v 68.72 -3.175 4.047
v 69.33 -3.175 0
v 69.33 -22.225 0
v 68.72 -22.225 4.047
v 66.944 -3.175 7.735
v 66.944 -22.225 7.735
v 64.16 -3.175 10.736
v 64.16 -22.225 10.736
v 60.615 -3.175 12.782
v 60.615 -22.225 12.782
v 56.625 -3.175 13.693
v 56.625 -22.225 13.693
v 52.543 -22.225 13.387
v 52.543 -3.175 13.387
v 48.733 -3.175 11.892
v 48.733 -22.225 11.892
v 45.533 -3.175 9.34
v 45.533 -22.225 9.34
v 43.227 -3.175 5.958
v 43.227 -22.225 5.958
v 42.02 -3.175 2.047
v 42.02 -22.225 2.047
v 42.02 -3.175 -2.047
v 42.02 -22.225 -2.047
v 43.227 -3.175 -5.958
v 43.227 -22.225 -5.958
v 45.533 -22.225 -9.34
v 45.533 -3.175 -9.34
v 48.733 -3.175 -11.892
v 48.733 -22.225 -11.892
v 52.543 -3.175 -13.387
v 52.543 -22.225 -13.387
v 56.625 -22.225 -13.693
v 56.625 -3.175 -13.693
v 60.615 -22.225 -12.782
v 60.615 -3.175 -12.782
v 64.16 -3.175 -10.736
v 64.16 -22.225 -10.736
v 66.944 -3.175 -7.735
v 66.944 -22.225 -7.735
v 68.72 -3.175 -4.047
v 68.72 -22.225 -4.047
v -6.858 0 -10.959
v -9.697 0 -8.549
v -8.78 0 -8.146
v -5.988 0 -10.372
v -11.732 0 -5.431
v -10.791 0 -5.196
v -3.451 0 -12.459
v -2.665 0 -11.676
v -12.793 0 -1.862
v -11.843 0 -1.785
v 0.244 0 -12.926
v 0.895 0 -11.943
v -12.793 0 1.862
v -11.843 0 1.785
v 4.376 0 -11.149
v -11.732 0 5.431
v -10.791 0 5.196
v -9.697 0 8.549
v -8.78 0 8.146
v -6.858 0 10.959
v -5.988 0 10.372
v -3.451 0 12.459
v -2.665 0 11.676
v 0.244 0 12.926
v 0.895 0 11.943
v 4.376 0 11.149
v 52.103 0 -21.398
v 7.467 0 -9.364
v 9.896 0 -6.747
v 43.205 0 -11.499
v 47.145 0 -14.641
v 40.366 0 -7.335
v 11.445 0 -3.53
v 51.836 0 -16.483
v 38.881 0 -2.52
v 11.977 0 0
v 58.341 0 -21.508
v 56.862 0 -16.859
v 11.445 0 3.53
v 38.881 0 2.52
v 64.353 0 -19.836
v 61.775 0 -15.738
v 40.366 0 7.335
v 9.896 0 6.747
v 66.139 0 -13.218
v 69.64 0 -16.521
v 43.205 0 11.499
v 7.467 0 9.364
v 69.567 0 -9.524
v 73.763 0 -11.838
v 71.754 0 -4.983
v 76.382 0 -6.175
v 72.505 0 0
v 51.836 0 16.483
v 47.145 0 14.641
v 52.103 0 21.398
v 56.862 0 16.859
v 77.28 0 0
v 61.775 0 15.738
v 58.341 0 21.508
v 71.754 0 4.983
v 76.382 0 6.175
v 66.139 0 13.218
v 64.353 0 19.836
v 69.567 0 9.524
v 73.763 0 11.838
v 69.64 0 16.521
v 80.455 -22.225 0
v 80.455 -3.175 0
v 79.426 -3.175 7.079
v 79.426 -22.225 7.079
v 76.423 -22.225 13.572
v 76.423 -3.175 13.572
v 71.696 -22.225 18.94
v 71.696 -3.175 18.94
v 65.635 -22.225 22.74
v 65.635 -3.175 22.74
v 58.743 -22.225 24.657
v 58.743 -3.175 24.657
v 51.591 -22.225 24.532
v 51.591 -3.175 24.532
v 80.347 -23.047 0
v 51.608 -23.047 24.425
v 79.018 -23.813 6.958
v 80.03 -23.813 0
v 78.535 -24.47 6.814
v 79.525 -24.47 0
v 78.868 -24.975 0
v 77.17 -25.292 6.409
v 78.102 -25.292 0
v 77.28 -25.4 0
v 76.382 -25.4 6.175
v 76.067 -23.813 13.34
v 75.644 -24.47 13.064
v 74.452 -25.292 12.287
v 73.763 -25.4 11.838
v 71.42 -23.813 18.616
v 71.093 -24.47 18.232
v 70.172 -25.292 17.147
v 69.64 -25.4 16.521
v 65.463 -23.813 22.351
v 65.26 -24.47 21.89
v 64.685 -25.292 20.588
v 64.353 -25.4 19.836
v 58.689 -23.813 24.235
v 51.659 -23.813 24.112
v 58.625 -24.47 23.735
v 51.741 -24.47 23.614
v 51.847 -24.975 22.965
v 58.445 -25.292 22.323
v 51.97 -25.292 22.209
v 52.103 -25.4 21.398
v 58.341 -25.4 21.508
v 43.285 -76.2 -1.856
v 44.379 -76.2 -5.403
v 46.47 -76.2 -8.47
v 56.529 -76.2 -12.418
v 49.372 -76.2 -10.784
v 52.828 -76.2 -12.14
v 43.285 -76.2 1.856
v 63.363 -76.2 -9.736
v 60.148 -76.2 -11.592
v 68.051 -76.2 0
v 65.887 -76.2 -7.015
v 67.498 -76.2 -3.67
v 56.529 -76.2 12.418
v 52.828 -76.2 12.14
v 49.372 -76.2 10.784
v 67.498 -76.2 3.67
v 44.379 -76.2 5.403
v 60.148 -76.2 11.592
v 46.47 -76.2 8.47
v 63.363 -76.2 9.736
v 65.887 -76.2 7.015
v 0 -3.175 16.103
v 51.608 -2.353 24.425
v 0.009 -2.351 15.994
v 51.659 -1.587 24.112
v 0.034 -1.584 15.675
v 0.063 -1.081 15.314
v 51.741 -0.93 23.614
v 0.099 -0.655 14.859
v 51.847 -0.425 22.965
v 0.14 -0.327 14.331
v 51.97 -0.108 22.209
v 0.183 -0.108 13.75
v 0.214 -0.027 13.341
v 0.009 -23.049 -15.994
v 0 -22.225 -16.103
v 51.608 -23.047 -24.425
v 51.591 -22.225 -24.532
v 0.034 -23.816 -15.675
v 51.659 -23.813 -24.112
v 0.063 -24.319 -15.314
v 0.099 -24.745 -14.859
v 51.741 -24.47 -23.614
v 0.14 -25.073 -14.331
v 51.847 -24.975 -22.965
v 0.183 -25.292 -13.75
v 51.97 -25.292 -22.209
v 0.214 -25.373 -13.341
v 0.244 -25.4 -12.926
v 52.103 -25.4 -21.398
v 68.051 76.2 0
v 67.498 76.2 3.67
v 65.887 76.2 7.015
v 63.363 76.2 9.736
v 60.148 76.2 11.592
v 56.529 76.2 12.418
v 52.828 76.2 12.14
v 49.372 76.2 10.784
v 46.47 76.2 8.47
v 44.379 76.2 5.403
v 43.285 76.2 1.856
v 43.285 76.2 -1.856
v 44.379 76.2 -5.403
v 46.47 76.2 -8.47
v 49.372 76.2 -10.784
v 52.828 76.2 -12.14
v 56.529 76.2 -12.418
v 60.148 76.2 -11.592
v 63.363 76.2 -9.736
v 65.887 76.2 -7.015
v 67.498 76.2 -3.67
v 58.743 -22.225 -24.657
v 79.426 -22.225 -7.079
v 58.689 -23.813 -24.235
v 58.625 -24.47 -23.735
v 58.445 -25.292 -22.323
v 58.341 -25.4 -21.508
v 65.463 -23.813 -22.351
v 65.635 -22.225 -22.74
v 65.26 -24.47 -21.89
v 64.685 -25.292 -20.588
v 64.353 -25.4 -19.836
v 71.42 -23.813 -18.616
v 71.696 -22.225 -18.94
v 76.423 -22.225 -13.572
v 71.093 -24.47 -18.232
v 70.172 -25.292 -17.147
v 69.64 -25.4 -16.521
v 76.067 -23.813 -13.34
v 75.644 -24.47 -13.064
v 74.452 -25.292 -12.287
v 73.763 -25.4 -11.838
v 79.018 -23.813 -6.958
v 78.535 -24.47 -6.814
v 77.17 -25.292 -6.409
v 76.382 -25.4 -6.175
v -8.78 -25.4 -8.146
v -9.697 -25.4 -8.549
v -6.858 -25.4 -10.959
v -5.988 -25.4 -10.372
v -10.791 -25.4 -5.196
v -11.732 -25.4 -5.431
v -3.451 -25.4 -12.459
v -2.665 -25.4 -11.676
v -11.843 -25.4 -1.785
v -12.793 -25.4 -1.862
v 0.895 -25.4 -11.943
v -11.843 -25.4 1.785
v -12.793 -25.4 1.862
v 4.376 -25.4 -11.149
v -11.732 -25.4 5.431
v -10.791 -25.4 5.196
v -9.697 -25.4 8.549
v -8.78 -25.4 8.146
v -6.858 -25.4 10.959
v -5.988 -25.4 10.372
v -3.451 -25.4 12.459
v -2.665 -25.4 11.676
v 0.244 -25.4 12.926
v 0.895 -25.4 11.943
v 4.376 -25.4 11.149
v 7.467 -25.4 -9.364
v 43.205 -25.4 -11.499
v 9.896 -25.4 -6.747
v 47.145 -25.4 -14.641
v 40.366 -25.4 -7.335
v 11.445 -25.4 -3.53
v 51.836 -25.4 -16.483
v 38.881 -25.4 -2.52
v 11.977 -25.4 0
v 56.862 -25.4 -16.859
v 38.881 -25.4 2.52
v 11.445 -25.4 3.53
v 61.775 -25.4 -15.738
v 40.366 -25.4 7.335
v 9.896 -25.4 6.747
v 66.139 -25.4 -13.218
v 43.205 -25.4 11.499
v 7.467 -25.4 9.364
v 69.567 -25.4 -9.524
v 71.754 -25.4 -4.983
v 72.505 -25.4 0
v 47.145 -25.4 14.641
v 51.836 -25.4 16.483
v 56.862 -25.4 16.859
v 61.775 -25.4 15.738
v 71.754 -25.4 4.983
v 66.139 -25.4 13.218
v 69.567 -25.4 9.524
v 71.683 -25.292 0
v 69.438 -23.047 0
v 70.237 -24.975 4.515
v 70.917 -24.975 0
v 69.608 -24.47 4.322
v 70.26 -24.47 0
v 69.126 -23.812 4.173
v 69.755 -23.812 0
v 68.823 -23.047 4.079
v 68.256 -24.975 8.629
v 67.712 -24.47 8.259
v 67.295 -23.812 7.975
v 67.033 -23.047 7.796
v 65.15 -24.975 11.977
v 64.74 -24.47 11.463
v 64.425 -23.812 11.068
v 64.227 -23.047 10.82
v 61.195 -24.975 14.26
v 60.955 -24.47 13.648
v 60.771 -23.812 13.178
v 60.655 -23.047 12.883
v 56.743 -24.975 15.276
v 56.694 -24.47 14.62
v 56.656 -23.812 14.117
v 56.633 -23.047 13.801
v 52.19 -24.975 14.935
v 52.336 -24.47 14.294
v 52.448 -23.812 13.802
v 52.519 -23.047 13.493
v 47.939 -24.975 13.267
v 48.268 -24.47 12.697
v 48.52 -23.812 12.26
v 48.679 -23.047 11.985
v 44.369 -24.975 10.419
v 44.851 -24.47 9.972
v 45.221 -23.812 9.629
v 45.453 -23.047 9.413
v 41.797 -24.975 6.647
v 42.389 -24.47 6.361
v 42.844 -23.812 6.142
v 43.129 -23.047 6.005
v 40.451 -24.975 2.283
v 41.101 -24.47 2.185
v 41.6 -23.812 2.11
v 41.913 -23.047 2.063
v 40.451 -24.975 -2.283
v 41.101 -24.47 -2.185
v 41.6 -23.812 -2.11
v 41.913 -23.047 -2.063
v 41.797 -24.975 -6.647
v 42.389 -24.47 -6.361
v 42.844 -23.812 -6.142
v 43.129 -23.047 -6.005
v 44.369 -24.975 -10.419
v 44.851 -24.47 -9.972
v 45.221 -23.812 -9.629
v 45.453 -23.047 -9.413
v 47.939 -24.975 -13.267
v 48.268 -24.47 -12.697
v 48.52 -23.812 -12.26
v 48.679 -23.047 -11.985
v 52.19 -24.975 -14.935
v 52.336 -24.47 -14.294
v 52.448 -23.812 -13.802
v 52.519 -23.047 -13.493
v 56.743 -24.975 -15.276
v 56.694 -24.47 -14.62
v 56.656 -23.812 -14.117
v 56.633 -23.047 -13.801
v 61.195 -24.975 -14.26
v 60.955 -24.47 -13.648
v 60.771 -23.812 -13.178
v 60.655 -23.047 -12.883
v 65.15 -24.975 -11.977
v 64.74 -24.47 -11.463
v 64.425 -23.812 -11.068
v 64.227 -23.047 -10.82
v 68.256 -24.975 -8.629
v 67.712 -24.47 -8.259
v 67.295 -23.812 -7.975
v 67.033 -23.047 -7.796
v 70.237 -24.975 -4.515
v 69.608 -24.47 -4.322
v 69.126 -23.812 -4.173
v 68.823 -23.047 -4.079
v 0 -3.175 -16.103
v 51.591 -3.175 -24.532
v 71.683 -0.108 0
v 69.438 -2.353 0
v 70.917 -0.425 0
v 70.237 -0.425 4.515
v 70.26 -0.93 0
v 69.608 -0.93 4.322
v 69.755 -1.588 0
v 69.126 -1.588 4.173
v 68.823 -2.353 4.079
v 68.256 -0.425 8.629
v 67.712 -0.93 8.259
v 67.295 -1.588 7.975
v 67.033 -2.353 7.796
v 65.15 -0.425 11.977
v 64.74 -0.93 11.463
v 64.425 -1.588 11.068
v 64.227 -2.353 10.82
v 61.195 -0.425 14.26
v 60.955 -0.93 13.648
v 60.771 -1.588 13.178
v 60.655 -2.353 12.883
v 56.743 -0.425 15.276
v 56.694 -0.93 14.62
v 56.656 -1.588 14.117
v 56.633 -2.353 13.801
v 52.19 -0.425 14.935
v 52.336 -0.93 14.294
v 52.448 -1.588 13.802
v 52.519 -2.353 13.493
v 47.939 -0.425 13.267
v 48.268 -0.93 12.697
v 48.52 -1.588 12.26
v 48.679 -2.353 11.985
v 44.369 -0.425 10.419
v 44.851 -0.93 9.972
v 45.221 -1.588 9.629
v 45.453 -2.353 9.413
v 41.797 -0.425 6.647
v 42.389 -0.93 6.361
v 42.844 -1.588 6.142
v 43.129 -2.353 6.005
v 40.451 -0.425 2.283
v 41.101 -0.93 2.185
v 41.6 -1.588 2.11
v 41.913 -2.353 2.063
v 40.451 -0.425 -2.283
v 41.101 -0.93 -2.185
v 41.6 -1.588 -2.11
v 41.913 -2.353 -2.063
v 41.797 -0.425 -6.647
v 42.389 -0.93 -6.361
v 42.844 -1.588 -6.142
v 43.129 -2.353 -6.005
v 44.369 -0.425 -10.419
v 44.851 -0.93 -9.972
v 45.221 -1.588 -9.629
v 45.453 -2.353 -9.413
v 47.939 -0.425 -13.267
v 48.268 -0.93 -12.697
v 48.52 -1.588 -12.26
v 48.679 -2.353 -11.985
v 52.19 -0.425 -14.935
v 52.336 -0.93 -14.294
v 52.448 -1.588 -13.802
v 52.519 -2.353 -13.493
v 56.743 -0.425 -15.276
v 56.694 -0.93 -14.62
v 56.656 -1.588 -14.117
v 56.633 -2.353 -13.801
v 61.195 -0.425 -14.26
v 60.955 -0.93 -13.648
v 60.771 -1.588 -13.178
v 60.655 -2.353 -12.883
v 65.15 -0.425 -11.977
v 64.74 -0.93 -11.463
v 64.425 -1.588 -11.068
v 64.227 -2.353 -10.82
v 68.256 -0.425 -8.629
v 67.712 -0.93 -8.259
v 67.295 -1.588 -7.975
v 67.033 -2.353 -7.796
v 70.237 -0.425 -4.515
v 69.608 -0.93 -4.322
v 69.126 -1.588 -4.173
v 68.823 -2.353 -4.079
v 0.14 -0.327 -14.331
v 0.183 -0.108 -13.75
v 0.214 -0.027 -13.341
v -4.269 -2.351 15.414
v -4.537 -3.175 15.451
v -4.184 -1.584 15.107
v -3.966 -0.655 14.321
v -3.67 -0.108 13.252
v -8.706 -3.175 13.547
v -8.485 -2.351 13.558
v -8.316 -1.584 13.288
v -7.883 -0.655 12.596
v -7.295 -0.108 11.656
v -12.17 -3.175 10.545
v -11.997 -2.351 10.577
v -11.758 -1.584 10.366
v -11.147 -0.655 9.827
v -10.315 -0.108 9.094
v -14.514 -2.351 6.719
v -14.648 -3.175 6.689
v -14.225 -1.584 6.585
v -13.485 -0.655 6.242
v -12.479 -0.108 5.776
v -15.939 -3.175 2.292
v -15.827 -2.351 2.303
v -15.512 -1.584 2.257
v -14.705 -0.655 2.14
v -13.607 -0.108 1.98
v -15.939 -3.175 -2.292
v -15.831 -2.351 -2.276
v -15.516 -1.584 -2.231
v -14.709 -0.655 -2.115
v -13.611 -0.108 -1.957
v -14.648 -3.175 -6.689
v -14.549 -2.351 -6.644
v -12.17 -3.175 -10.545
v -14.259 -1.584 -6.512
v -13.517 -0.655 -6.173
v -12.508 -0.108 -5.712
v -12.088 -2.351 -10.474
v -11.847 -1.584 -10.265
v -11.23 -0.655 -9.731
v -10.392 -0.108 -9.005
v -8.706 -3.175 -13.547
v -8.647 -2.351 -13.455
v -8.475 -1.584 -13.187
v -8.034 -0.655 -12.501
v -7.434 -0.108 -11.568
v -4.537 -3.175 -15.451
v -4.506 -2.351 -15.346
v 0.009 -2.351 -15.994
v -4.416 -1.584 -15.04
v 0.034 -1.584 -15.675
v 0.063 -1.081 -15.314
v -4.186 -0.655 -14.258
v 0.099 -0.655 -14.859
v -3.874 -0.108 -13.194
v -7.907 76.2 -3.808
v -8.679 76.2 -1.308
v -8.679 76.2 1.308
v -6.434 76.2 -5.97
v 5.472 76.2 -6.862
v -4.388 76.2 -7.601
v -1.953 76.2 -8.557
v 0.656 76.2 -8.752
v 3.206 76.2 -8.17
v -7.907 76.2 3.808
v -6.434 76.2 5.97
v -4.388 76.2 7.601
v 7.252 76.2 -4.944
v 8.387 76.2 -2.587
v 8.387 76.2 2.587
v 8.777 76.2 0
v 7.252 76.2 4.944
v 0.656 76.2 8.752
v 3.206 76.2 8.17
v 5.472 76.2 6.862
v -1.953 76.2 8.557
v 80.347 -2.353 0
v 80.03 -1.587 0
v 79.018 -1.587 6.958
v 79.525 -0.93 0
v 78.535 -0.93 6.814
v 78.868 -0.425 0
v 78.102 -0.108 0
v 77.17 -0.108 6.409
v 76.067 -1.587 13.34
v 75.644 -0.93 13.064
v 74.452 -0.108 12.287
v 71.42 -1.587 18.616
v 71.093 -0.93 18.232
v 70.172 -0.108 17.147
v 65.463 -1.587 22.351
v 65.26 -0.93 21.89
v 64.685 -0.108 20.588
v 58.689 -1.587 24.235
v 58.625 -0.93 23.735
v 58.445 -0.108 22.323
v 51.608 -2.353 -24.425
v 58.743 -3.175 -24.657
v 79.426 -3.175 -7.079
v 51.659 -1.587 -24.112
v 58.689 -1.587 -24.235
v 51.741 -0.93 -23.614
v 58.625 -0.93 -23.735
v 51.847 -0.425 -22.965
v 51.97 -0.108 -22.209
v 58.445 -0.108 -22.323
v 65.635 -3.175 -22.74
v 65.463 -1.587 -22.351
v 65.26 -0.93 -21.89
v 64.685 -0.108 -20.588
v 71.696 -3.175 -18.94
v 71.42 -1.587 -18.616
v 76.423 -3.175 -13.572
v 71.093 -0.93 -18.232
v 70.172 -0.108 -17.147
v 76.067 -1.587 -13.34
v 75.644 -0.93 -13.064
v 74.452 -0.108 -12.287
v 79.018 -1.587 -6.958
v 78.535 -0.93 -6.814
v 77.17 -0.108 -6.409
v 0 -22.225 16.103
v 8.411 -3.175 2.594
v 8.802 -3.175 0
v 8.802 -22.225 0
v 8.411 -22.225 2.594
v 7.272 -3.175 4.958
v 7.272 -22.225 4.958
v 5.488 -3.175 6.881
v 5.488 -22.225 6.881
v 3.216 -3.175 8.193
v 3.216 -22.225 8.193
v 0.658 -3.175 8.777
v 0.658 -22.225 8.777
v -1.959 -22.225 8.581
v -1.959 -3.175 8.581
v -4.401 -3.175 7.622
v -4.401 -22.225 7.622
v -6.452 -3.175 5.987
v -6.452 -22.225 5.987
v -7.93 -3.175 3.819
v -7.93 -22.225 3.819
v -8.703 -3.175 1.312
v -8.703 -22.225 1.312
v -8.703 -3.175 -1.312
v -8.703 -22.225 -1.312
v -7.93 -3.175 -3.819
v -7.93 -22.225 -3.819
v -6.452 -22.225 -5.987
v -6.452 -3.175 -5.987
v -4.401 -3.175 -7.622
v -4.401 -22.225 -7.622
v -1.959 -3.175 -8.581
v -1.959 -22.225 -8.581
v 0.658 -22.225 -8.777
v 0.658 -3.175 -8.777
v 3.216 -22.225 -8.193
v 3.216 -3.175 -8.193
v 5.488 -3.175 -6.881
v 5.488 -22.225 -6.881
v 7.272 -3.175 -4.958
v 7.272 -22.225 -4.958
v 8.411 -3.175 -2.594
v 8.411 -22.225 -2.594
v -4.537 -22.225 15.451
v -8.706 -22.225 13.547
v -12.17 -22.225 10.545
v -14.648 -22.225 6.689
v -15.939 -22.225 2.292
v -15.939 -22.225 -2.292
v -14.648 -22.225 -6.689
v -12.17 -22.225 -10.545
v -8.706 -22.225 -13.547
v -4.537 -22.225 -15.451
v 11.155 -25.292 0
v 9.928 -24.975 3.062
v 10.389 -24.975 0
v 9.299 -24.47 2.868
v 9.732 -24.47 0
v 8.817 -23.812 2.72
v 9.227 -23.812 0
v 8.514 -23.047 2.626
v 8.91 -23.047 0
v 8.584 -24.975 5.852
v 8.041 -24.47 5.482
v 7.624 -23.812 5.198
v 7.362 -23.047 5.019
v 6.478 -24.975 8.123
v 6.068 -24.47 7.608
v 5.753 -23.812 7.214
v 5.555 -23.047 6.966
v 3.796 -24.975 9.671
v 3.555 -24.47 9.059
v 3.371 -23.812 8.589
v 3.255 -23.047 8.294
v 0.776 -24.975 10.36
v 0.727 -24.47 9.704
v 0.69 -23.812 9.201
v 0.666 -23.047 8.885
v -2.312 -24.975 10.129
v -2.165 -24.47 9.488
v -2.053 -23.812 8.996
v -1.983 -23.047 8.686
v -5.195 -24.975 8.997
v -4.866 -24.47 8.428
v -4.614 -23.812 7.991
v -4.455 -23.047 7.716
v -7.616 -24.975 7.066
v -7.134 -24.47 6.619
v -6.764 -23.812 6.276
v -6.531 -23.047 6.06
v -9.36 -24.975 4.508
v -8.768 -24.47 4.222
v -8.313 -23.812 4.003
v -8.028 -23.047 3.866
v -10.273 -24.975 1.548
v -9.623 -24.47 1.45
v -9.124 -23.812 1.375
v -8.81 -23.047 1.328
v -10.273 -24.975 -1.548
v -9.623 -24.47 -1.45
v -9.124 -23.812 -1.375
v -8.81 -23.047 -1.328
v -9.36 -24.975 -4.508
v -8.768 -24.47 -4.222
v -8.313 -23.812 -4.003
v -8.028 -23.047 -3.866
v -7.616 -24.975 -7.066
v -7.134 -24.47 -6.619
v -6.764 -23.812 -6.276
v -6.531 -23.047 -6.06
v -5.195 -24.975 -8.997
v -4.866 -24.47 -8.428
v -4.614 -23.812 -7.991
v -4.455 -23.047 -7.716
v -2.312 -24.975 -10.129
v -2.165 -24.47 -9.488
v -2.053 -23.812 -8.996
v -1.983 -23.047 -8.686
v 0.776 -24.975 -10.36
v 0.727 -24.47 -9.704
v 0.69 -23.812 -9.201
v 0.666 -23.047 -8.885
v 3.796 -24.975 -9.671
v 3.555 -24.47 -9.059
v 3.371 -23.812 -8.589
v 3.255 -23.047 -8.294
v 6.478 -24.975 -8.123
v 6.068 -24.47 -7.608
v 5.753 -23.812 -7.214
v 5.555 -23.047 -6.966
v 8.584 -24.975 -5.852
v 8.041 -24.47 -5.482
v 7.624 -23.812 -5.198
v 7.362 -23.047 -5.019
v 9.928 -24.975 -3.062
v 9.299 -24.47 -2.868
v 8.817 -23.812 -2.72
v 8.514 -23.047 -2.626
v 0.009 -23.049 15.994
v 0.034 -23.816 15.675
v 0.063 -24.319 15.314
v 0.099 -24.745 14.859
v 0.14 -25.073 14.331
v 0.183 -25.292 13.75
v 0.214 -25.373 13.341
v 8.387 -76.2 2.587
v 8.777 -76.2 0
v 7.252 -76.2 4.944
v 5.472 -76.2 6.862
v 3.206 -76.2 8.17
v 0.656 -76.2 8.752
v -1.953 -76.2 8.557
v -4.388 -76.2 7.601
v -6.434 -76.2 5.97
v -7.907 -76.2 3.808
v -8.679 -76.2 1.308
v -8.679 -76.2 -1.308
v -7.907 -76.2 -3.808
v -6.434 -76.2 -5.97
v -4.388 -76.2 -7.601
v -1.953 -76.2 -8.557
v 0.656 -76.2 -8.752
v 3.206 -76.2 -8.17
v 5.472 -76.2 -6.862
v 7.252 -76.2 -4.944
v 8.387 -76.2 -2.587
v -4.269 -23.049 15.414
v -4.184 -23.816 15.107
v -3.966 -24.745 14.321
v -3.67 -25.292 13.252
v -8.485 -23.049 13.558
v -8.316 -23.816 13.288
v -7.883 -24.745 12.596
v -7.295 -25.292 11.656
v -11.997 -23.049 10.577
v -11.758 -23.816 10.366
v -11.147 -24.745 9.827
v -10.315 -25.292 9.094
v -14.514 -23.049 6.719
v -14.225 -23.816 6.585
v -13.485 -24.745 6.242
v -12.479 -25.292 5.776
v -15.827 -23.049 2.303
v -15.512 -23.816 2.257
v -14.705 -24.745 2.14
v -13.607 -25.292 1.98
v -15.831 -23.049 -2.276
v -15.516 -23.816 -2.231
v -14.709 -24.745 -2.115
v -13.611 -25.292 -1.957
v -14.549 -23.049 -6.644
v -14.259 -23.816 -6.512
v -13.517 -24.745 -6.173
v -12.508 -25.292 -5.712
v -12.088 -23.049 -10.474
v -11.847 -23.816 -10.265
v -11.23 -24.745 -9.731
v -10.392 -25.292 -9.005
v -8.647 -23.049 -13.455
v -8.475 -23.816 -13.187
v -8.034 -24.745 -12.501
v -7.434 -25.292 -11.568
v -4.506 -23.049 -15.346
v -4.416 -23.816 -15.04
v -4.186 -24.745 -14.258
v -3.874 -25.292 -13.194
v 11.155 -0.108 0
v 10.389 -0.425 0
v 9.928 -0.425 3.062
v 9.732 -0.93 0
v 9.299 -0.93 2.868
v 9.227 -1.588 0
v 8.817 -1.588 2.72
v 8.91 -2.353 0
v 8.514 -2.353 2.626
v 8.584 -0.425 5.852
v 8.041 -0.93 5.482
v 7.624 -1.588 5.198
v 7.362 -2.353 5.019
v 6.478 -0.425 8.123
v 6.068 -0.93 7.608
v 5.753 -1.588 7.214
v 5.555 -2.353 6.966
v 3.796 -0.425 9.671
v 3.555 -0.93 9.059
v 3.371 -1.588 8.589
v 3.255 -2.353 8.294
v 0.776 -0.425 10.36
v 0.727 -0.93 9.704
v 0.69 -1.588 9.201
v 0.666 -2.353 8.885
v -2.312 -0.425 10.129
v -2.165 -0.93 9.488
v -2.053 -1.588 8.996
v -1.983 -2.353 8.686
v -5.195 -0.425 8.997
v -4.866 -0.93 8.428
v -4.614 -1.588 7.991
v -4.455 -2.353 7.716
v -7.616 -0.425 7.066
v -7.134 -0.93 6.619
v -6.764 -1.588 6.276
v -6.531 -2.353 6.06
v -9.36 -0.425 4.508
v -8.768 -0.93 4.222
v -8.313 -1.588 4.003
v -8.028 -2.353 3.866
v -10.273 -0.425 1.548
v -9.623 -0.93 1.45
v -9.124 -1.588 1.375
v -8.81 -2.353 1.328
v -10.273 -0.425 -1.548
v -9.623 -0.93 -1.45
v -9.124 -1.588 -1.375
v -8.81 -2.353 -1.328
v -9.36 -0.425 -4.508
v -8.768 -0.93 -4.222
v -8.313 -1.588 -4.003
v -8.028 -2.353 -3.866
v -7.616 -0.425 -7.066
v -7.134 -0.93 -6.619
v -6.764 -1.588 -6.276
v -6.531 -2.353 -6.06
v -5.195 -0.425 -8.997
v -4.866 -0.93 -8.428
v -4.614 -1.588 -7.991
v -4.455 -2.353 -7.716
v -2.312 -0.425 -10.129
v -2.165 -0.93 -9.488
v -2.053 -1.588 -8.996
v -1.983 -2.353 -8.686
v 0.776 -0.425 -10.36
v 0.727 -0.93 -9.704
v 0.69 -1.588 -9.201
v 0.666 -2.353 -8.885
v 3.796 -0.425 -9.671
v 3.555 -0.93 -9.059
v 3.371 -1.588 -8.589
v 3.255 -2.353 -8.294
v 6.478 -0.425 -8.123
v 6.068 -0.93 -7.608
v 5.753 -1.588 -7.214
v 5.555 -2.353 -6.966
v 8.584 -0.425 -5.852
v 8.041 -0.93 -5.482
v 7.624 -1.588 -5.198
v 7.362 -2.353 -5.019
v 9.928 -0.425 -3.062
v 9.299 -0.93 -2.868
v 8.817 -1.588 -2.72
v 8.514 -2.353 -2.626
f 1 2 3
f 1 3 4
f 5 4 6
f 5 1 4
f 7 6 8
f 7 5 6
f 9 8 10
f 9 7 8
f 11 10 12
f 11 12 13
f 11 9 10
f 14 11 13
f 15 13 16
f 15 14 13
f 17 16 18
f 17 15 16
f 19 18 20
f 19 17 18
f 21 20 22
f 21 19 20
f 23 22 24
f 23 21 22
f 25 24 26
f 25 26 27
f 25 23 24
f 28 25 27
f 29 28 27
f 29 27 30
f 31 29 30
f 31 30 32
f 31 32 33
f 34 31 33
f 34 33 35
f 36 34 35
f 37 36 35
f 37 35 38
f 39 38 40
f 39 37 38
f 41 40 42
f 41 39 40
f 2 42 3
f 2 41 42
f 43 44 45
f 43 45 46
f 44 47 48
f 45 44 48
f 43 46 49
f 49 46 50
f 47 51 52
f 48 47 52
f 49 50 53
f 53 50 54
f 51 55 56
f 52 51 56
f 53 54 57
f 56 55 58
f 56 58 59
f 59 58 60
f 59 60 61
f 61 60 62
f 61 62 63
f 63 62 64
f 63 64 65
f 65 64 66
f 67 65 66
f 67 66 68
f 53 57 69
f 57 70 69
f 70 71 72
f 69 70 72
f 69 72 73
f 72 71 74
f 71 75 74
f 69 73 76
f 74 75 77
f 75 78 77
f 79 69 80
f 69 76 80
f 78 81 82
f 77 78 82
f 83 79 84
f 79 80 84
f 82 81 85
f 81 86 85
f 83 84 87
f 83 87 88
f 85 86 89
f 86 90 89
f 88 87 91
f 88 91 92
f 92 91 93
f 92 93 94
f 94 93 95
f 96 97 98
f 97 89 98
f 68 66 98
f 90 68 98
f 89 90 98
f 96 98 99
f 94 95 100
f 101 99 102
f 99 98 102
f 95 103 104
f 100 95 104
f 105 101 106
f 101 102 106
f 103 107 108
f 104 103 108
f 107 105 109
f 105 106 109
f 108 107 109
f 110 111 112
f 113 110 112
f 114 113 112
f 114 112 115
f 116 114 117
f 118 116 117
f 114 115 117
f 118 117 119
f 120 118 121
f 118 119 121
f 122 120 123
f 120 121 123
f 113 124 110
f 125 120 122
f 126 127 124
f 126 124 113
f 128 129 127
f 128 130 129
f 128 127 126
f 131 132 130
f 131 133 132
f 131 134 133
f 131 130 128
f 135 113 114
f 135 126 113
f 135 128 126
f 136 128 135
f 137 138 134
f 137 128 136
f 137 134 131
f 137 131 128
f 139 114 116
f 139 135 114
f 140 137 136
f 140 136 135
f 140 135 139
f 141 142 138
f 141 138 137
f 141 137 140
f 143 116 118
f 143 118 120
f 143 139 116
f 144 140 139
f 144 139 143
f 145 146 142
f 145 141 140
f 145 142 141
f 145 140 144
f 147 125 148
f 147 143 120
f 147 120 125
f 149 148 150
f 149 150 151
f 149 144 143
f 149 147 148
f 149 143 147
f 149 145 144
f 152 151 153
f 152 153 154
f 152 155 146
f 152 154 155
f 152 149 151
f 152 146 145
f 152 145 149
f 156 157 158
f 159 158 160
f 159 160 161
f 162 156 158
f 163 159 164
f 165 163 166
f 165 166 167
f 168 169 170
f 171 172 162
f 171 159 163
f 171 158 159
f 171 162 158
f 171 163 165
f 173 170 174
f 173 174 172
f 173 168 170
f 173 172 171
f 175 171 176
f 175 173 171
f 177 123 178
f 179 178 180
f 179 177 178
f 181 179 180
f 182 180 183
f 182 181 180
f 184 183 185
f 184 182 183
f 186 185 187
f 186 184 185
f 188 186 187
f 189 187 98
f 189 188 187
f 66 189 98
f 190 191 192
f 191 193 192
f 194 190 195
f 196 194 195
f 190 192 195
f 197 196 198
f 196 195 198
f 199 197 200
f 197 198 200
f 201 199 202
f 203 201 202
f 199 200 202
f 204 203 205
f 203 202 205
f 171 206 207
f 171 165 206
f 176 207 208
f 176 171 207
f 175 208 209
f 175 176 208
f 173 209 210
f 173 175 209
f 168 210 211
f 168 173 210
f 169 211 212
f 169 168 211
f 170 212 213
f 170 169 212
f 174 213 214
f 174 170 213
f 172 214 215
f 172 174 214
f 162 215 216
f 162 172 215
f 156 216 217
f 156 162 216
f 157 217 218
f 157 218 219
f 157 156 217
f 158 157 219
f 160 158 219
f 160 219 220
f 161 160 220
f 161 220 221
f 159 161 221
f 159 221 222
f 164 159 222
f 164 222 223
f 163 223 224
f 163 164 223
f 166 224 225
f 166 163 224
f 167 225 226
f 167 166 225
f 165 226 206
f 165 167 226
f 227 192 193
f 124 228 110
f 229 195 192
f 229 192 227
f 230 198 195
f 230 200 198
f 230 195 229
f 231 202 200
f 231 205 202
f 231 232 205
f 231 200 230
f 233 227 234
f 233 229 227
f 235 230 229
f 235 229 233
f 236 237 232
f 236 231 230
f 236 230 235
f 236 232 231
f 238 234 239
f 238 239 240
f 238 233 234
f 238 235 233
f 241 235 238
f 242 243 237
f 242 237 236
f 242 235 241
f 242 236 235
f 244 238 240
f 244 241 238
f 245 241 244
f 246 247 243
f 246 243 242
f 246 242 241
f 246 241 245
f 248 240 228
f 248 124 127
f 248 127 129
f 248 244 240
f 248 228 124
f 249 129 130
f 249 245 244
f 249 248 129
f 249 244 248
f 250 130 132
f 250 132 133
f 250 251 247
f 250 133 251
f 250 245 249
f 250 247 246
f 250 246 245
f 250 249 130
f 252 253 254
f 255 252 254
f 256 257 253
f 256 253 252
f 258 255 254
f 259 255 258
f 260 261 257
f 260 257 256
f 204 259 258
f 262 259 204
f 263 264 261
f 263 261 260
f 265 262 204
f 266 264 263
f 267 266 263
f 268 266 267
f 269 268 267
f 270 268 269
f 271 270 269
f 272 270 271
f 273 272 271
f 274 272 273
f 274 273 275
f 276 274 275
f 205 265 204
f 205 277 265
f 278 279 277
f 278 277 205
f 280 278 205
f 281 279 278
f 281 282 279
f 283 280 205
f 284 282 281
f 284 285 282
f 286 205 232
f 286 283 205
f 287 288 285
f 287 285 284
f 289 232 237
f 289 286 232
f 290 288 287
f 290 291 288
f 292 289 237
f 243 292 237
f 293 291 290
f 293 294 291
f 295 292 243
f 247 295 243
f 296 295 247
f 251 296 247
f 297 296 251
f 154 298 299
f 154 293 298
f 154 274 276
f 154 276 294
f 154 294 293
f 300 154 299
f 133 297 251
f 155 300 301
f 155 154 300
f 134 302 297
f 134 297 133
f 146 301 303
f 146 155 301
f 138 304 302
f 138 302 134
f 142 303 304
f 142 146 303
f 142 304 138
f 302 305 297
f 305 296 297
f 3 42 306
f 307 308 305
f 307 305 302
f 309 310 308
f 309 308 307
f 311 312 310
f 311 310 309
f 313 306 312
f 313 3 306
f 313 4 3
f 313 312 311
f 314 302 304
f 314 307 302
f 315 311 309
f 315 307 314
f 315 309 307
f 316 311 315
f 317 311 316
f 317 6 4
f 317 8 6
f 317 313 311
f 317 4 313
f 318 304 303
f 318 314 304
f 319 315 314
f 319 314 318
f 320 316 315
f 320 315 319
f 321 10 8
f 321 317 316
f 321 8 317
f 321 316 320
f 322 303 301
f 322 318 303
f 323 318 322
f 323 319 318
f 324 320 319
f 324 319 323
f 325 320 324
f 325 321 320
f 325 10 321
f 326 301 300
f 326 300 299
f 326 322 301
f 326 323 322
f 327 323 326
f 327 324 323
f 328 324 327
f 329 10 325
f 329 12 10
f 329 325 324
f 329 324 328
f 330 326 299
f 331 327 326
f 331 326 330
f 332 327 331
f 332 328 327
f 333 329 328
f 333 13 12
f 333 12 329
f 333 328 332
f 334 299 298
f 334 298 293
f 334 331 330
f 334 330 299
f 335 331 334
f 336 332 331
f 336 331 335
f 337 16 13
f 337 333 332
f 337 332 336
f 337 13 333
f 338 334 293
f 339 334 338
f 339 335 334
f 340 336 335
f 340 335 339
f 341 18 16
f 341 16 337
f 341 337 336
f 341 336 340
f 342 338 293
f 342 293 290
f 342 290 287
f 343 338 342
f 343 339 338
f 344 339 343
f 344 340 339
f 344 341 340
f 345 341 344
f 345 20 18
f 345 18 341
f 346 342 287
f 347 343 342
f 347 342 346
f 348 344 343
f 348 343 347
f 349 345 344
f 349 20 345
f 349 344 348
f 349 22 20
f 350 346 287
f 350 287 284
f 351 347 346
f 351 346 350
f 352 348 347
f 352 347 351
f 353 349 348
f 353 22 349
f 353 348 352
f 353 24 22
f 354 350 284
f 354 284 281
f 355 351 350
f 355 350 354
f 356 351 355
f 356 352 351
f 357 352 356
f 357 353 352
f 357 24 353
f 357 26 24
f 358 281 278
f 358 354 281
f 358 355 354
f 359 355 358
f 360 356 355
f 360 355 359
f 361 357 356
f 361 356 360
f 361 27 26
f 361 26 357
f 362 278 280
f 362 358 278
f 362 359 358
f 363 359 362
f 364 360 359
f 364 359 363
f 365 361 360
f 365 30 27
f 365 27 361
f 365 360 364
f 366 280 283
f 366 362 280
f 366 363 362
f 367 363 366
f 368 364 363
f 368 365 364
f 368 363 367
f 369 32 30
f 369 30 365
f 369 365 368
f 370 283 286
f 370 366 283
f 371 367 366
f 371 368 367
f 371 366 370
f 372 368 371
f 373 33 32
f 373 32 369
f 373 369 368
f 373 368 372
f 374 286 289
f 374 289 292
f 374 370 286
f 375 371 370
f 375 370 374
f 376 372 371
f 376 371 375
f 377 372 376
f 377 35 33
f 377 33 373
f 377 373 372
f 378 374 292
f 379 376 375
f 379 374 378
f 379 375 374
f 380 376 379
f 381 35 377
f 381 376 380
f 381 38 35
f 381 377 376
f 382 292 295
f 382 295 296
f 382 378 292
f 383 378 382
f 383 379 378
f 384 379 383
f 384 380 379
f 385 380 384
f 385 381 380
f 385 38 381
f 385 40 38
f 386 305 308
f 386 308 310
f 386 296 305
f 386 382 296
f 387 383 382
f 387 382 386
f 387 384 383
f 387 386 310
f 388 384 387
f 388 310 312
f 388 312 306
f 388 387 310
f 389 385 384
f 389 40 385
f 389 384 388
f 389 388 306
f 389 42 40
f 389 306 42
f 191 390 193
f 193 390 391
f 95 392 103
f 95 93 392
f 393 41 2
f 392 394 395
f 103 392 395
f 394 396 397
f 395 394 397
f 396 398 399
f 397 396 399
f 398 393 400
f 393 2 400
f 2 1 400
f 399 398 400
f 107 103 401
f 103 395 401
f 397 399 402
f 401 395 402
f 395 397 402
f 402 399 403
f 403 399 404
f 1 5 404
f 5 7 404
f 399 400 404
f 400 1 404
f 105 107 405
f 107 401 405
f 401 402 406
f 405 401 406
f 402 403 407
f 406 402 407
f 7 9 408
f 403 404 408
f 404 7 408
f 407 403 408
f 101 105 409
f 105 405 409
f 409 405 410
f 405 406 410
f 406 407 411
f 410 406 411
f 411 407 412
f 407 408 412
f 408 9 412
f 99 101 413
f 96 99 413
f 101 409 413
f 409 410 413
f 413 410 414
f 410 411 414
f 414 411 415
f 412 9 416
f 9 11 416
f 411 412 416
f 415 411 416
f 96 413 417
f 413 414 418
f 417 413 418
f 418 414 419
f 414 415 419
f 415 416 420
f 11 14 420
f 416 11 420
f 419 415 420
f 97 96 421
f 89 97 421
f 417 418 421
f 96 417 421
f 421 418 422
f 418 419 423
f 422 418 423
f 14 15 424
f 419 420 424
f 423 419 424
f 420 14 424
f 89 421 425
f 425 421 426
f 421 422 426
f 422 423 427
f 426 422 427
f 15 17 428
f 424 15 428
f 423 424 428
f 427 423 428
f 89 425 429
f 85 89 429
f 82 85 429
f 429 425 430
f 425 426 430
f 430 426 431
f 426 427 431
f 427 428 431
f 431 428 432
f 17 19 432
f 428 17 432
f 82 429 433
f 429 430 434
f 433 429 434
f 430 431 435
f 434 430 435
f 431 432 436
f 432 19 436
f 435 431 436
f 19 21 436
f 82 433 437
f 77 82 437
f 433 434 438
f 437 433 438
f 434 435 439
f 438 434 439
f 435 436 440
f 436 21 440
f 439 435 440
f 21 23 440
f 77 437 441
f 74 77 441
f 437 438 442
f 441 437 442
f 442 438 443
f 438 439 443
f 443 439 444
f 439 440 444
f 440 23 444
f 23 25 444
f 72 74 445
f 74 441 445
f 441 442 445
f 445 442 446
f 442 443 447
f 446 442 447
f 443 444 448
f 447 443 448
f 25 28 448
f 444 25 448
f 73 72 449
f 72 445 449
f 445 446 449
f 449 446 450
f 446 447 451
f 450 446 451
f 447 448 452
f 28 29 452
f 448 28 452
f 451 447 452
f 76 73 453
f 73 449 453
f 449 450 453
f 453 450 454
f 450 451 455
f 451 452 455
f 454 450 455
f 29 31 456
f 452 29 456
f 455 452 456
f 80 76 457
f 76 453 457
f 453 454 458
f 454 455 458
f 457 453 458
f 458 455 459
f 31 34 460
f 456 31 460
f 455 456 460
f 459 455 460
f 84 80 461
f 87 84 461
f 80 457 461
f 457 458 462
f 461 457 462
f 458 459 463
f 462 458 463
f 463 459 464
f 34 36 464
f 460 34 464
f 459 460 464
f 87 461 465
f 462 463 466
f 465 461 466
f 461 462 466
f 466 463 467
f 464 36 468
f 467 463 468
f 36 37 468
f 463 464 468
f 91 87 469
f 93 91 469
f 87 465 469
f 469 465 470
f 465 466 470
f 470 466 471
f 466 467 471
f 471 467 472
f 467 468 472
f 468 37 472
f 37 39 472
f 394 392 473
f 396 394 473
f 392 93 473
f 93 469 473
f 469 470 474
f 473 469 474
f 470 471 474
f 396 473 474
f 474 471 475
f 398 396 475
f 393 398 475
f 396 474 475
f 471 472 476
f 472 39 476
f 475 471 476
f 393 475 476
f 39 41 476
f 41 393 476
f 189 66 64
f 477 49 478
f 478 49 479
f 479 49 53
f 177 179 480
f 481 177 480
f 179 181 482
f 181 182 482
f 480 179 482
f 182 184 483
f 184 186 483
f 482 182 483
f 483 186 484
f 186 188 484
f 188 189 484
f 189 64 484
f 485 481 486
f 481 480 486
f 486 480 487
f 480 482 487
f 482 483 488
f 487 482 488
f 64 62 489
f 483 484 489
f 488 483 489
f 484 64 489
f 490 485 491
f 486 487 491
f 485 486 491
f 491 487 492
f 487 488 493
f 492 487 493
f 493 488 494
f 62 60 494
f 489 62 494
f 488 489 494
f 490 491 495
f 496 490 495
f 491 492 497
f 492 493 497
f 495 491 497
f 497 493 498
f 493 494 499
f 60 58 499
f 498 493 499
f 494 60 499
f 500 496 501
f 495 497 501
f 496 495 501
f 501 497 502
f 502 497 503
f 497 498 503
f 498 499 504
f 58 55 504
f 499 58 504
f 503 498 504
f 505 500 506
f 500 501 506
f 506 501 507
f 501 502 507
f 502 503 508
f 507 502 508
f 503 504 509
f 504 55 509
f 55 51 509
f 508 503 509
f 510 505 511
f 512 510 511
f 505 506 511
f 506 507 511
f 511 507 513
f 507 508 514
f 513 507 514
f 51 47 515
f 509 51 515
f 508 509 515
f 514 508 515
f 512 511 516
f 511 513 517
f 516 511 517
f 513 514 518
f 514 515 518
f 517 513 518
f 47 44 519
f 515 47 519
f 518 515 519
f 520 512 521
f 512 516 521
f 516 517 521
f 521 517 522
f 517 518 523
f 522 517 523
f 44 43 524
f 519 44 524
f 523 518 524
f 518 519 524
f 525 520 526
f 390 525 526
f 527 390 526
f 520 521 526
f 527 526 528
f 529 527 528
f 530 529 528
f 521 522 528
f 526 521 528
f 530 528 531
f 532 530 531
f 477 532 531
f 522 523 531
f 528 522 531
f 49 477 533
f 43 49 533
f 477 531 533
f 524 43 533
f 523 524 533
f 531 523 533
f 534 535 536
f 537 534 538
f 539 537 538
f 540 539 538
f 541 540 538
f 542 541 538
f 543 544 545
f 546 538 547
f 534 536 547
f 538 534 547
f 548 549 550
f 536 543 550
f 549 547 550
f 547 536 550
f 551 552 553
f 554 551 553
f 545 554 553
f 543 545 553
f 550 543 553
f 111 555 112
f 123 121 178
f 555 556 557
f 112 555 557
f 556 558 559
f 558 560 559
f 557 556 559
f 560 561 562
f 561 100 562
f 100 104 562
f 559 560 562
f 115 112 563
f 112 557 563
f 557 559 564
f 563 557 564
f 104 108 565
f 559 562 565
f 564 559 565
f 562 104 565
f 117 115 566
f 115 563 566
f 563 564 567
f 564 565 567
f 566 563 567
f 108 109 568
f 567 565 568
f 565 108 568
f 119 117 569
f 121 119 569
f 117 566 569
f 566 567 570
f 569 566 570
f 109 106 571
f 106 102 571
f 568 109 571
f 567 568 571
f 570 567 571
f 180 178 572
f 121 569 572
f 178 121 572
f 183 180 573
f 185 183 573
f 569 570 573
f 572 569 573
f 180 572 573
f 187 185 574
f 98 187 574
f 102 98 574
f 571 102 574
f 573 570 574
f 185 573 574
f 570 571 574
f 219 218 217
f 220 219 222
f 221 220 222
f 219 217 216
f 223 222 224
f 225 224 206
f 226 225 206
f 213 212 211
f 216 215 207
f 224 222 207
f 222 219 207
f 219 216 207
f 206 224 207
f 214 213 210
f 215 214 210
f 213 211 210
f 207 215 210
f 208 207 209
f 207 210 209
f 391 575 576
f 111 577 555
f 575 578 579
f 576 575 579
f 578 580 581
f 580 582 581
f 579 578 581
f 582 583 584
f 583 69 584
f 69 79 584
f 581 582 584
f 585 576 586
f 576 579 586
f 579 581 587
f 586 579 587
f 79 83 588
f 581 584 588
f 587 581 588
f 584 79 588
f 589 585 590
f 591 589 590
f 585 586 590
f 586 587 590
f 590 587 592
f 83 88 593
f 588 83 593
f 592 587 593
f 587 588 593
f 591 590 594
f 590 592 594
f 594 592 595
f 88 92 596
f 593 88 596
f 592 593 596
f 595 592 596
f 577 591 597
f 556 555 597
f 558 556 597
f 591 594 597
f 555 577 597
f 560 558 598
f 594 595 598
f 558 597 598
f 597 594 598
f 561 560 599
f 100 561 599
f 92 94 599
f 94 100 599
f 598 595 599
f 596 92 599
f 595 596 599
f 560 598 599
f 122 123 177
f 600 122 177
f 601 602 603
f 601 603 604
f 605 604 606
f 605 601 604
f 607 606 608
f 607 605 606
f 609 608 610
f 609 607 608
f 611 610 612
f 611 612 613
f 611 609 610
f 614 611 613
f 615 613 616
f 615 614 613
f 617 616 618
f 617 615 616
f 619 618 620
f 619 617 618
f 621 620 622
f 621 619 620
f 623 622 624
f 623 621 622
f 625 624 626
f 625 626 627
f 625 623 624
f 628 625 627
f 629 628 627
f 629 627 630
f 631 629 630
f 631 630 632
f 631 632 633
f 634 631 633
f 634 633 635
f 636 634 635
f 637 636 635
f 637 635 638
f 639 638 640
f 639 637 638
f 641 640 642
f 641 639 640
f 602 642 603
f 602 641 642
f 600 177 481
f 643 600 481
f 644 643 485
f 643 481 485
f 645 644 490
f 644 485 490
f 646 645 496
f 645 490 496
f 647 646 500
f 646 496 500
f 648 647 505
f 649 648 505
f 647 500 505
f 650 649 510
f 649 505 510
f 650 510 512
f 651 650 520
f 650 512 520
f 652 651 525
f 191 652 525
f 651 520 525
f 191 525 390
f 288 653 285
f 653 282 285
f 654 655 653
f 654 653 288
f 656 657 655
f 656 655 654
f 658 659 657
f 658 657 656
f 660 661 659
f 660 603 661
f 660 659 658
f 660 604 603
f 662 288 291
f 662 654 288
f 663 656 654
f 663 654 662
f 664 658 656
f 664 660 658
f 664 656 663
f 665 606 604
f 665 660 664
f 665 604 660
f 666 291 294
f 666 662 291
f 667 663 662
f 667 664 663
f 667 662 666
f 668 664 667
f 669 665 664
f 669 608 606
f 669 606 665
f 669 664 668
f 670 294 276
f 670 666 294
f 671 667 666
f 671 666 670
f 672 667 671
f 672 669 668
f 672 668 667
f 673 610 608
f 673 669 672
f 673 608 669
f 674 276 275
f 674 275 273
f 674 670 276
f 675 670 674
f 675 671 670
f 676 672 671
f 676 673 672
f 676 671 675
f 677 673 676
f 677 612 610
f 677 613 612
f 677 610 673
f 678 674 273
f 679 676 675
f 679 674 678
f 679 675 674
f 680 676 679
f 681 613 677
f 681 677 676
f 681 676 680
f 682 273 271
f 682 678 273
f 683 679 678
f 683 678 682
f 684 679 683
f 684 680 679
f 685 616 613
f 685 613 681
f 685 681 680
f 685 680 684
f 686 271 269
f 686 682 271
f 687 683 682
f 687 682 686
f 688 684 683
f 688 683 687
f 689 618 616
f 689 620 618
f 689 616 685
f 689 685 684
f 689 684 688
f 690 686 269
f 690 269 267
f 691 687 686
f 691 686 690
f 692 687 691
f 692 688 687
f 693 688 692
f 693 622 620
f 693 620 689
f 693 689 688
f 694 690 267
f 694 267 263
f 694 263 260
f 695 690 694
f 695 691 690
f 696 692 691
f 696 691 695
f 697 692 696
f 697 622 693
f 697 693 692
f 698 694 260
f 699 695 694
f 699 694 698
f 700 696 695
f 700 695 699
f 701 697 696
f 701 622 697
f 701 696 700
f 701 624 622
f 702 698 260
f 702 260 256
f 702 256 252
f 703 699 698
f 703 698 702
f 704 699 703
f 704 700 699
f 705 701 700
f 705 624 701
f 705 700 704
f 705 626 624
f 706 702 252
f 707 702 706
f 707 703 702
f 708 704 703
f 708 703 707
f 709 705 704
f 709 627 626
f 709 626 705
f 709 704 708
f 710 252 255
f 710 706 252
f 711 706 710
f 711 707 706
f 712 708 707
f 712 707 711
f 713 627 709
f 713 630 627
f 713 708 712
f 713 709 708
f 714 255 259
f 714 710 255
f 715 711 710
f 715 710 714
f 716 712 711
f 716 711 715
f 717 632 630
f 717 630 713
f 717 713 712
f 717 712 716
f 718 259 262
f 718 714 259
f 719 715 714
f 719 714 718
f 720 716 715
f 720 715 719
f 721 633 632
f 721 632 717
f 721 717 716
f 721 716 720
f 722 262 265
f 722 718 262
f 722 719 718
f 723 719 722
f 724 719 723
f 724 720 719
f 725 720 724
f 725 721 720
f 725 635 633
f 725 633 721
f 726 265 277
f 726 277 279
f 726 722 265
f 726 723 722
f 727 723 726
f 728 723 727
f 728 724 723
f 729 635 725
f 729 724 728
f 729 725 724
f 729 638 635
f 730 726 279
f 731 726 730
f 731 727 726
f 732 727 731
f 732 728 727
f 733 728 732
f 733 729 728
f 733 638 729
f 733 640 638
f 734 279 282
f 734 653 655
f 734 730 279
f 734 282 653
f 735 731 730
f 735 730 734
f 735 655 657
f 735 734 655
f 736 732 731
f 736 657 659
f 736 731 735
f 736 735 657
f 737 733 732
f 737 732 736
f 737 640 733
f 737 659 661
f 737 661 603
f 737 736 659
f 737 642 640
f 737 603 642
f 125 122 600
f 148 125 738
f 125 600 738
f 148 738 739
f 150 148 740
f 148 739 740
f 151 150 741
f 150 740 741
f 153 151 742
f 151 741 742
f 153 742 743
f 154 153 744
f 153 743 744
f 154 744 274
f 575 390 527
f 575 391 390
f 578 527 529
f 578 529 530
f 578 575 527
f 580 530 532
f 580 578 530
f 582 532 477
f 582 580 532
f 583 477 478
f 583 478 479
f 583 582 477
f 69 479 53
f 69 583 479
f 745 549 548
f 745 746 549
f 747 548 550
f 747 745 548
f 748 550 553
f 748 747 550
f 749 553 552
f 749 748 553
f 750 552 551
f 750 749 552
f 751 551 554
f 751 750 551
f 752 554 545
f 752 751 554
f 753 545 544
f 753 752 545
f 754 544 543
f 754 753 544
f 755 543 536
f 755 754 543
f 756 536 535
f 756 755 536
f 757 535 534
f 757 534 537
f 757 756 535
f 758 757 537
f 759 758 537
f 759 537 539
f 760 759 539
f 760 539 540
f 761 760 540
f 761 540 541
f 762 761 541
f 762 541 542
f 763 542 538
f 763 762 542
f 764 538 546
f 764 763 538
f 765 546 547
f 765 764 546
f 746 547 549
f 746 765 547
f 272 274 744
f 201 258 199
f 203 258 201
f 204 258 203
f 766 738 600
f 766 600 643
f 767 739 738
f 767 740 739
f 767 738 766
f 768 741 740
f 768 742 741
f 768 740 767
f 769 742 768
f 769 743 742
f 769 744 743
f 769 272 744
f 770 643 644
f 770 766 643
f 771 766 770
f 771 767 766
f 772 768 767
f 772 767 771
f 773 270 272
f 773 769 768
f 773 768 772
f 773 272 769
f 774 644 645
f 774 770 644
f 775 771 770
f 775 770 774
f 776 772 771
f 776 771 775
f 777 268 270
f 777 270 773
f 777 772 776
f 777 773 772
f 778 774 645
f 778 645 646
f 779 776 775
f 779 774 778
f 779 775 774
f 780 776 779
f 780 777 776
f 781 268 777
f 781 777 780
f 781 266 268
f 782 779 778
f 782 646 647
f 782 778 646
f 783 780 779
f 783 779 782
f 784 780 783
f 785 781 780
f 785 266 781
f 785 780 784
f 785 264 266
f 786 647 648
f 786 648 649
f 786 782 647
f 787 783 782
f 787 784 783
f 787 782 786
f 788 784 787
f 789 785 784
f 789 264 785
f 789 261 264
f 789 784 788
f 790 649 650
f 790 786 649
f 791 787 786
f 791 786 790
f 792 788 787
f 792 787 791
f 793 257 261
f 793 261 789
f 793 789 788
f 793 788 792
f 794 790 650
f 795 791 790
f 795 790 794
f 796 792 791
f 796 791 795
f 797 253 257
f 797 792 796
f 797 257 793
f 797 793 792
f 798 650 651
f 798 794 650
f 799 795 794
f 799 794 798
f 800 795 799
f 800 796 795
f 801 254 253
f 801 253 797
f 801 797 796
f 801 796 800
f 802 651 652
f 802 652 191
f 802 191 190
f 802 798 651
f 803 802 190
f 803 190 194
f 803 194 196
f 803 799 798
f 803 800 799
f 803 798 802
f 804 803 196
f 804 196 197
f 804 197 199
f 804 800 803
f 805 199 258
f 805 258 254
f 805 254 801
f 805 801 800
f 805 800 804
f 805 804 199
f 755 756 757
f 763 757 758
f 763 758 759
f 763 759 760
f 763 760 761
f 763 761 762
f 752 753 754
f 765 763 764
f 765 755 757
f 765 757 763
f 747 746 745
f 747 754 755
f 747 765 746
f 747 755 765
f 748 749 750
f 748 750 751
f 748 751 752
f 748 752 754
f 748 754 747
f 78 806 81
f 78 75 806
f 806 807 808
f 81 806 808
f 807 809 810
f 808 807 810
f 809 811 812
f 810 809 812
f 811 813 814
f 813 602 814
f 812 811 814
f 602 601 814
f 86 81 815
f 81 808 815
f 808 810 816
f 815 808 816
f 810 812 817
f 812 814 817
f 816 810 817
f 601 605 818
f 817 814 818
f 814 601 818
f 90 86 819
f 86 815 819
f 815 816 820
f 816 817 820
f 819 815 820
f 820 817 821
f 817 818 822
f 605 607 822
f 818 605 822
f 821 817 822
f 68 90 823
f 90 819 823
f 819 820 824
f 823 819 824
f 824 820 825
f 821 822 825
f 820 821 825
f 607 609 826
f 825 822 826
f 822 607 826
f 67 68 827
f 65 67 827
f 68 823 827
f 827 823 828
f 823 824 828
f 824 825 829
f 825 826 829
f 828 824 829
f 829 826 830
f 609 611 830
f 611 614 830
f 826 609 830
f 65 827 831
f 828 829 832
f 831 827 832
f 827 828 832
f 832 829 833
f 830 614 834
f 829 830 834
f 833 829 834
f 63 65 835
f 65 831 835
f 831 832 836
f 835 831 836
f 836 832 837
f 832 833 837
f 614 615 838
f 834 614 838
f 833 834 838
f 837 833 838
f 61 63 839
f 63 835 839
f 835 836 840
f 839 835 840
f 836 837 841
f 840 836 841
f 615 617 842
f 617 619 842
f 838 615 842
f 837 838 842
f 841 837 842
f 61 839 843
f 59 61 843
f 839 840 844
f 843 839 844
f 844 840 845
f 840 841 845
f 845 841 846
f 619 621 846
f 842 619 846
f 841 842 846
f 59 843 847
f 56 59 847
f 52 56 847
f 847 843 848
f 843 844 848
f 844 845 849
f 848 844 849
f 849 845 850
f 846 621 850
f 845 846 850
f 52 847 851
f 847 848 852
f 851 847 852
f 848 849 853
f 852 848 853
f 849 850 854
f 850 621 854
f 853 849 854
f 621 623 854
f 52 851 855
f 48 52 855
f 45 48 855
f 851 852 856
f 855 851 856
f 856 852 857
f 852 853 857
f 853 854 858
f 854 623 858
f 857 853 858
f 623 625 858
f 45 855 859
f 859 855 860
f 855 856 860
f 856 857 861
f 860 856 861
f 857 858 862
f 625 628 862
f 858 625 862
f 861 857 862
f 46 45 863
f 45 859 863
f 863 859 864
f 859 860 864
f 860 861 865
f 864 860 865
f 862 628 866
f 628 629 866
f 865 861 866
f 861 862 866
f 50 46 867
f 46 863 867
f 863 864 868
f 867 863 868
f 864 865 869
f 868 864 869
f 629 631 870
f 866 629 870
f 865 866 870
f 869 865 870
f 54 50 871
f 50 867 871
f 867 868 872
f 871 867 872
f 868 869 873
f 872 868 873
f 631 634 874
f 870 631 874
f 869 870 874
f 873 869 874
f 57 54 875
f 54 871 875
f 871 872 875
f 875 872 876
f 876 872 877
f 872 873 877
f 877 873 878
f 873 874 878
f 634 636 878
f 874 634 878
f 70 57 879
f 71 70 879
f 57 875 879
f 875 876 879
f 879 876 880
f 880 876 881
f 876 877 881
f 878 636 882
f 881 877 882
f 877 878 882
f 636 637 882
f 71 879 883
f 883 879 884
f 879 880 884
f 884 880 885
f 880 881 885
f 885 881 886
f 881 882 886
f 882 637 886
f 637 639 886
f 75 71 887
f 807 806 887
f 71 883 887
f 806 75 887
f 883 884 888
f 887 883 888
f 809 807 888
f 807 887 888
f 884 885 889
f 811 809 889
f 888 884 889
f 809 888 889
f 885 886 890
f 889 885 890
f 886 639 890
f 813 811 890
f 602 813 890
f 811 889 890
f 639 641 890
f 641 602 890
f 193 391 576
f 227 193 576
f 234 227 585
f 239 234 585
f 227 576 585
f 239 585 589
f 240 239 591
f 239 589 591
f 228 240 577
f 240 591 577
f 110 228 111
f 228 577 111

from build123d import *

# Parameters (mm, degrees)
F0_R     = 8.8016886399
F0_R_2   = 13.7313892378
F1_DEPTH = 25.4
F2_R     = 3.17499
F3_R     = 3.175
F4_R     = 8.7766269563
F5_DEPTH = 76.2
F6_R     = 12.4525244068
F7_DEPTH = 76.2


# Not quite as in the source:
# - a fillet or chamfer is up to 0.001 mm smaller than in the source, because OpenCascade refuses the exact size


with BuildPart() as f1:
    # F0 (on Front) → F1 (new body)
    with BuildSketch(Plane.XZ):
        with BuildLine():
            ThreePointArc((0, 16.1029876595), (11.3865317714, 11.3865317714), (16.1029876595, 0))
            ThreePointArc((16.1029876595, 0), (11.3865317714, -11.3865317714), (0, -16.1029876595))
            Line((0, -16.1029876595), (51.5906804684, -24.5315592152))
            ThreePointArc((51.5906804684, -24.5315592152), (30.7417076943, 0), (51.5906804684, 24.5315592152))
            Line((51.5906804684, 24.5315592152), (0, 16.1029876595))
        make_face()
        with BuildLine():
            ThreePointArc((0, -16.1029876595), (11.3865317714, -11.3865317714), (16.1029876595, 0))
            ThreePointArc((16.1029876595, 0), (11.3865317714, 11.3865317714), (0, 16.1029876595))
            ThreePointArc((0, 16.1029876595), (-16.1029876595, 0), (0, -16.1029876595))
        make_face()
        Circle(F0_R, mode=Mode.SUBTRACT)
        with BuildLine():
            ThreePointArc((80.4552870872, 0), (71.6956793123, 18.9404521645), (51.5906804684, 24.5315592152))
            ThreePointArc((51.5906804684, 24.5315592152), (30.7417076943, 0), (51.5906804684, -24.5315592152))
            ThreePointArc((51.5906804684, -24.5315592152), (71.6956793123, -18.9404521645), (80.4552870872, 0))
        make_face()
        with Locations((55.5984973907, 0)):
            Circle(F0_R_2, mode=Mode.SUBTRACT)
    extrude(amount=F1_DEPTH)

    # F2 (radius 3.175 in the source; OpenCascade refuses exactly that, so slightly less here)
    f2_edges = [f1.edges().sort_by_distance(p)[0] for p in [
        (80.455287, 0, 0),
        (25.79534, 0, 20.317273),
        (25.79534, -25.4, 20.317273),
        (25.79534, -25.4, -20.317273),
        (25.79534, 0, -20.317273),
        (80.455287, -25.4, 0),
        (-16.102988, -25.4, 0),
        (-16.102988, 0, 0),
    ]]
    fillet(f2_edges, radius=F2_R)

    # F3
    f3_edges = [f1.edges().sort_by_distance(p)[0] for p in [
        (41.867108, -25.4, 0),
        (-8.801689, -25.4, 0),
        (41.867108, 0, 0),
        (-8.801689, 0, 0),
    ]]
    fillet(f3_edges, radius=F3_R)


with BuildPart() as f5:
    # F4 (on Front) → F5 (new body, symmetric)
    with BuildSketch(Plane.XZ):
        Circle(F4_R)
    extrude(amount=F5_DEPTH, both=True)


with BuildPart() as f7:
    # F6 (on Front) → F7 (new body, symmetric)
    with BuildSketch(Plane.XZ):
        with Locations((55.5984973907, 0)):
            Circle(F6_R)
    extrude(amount=F7_DEPTH, both=True)


solid = Compound([f1.part, f5.part, f7.part])
